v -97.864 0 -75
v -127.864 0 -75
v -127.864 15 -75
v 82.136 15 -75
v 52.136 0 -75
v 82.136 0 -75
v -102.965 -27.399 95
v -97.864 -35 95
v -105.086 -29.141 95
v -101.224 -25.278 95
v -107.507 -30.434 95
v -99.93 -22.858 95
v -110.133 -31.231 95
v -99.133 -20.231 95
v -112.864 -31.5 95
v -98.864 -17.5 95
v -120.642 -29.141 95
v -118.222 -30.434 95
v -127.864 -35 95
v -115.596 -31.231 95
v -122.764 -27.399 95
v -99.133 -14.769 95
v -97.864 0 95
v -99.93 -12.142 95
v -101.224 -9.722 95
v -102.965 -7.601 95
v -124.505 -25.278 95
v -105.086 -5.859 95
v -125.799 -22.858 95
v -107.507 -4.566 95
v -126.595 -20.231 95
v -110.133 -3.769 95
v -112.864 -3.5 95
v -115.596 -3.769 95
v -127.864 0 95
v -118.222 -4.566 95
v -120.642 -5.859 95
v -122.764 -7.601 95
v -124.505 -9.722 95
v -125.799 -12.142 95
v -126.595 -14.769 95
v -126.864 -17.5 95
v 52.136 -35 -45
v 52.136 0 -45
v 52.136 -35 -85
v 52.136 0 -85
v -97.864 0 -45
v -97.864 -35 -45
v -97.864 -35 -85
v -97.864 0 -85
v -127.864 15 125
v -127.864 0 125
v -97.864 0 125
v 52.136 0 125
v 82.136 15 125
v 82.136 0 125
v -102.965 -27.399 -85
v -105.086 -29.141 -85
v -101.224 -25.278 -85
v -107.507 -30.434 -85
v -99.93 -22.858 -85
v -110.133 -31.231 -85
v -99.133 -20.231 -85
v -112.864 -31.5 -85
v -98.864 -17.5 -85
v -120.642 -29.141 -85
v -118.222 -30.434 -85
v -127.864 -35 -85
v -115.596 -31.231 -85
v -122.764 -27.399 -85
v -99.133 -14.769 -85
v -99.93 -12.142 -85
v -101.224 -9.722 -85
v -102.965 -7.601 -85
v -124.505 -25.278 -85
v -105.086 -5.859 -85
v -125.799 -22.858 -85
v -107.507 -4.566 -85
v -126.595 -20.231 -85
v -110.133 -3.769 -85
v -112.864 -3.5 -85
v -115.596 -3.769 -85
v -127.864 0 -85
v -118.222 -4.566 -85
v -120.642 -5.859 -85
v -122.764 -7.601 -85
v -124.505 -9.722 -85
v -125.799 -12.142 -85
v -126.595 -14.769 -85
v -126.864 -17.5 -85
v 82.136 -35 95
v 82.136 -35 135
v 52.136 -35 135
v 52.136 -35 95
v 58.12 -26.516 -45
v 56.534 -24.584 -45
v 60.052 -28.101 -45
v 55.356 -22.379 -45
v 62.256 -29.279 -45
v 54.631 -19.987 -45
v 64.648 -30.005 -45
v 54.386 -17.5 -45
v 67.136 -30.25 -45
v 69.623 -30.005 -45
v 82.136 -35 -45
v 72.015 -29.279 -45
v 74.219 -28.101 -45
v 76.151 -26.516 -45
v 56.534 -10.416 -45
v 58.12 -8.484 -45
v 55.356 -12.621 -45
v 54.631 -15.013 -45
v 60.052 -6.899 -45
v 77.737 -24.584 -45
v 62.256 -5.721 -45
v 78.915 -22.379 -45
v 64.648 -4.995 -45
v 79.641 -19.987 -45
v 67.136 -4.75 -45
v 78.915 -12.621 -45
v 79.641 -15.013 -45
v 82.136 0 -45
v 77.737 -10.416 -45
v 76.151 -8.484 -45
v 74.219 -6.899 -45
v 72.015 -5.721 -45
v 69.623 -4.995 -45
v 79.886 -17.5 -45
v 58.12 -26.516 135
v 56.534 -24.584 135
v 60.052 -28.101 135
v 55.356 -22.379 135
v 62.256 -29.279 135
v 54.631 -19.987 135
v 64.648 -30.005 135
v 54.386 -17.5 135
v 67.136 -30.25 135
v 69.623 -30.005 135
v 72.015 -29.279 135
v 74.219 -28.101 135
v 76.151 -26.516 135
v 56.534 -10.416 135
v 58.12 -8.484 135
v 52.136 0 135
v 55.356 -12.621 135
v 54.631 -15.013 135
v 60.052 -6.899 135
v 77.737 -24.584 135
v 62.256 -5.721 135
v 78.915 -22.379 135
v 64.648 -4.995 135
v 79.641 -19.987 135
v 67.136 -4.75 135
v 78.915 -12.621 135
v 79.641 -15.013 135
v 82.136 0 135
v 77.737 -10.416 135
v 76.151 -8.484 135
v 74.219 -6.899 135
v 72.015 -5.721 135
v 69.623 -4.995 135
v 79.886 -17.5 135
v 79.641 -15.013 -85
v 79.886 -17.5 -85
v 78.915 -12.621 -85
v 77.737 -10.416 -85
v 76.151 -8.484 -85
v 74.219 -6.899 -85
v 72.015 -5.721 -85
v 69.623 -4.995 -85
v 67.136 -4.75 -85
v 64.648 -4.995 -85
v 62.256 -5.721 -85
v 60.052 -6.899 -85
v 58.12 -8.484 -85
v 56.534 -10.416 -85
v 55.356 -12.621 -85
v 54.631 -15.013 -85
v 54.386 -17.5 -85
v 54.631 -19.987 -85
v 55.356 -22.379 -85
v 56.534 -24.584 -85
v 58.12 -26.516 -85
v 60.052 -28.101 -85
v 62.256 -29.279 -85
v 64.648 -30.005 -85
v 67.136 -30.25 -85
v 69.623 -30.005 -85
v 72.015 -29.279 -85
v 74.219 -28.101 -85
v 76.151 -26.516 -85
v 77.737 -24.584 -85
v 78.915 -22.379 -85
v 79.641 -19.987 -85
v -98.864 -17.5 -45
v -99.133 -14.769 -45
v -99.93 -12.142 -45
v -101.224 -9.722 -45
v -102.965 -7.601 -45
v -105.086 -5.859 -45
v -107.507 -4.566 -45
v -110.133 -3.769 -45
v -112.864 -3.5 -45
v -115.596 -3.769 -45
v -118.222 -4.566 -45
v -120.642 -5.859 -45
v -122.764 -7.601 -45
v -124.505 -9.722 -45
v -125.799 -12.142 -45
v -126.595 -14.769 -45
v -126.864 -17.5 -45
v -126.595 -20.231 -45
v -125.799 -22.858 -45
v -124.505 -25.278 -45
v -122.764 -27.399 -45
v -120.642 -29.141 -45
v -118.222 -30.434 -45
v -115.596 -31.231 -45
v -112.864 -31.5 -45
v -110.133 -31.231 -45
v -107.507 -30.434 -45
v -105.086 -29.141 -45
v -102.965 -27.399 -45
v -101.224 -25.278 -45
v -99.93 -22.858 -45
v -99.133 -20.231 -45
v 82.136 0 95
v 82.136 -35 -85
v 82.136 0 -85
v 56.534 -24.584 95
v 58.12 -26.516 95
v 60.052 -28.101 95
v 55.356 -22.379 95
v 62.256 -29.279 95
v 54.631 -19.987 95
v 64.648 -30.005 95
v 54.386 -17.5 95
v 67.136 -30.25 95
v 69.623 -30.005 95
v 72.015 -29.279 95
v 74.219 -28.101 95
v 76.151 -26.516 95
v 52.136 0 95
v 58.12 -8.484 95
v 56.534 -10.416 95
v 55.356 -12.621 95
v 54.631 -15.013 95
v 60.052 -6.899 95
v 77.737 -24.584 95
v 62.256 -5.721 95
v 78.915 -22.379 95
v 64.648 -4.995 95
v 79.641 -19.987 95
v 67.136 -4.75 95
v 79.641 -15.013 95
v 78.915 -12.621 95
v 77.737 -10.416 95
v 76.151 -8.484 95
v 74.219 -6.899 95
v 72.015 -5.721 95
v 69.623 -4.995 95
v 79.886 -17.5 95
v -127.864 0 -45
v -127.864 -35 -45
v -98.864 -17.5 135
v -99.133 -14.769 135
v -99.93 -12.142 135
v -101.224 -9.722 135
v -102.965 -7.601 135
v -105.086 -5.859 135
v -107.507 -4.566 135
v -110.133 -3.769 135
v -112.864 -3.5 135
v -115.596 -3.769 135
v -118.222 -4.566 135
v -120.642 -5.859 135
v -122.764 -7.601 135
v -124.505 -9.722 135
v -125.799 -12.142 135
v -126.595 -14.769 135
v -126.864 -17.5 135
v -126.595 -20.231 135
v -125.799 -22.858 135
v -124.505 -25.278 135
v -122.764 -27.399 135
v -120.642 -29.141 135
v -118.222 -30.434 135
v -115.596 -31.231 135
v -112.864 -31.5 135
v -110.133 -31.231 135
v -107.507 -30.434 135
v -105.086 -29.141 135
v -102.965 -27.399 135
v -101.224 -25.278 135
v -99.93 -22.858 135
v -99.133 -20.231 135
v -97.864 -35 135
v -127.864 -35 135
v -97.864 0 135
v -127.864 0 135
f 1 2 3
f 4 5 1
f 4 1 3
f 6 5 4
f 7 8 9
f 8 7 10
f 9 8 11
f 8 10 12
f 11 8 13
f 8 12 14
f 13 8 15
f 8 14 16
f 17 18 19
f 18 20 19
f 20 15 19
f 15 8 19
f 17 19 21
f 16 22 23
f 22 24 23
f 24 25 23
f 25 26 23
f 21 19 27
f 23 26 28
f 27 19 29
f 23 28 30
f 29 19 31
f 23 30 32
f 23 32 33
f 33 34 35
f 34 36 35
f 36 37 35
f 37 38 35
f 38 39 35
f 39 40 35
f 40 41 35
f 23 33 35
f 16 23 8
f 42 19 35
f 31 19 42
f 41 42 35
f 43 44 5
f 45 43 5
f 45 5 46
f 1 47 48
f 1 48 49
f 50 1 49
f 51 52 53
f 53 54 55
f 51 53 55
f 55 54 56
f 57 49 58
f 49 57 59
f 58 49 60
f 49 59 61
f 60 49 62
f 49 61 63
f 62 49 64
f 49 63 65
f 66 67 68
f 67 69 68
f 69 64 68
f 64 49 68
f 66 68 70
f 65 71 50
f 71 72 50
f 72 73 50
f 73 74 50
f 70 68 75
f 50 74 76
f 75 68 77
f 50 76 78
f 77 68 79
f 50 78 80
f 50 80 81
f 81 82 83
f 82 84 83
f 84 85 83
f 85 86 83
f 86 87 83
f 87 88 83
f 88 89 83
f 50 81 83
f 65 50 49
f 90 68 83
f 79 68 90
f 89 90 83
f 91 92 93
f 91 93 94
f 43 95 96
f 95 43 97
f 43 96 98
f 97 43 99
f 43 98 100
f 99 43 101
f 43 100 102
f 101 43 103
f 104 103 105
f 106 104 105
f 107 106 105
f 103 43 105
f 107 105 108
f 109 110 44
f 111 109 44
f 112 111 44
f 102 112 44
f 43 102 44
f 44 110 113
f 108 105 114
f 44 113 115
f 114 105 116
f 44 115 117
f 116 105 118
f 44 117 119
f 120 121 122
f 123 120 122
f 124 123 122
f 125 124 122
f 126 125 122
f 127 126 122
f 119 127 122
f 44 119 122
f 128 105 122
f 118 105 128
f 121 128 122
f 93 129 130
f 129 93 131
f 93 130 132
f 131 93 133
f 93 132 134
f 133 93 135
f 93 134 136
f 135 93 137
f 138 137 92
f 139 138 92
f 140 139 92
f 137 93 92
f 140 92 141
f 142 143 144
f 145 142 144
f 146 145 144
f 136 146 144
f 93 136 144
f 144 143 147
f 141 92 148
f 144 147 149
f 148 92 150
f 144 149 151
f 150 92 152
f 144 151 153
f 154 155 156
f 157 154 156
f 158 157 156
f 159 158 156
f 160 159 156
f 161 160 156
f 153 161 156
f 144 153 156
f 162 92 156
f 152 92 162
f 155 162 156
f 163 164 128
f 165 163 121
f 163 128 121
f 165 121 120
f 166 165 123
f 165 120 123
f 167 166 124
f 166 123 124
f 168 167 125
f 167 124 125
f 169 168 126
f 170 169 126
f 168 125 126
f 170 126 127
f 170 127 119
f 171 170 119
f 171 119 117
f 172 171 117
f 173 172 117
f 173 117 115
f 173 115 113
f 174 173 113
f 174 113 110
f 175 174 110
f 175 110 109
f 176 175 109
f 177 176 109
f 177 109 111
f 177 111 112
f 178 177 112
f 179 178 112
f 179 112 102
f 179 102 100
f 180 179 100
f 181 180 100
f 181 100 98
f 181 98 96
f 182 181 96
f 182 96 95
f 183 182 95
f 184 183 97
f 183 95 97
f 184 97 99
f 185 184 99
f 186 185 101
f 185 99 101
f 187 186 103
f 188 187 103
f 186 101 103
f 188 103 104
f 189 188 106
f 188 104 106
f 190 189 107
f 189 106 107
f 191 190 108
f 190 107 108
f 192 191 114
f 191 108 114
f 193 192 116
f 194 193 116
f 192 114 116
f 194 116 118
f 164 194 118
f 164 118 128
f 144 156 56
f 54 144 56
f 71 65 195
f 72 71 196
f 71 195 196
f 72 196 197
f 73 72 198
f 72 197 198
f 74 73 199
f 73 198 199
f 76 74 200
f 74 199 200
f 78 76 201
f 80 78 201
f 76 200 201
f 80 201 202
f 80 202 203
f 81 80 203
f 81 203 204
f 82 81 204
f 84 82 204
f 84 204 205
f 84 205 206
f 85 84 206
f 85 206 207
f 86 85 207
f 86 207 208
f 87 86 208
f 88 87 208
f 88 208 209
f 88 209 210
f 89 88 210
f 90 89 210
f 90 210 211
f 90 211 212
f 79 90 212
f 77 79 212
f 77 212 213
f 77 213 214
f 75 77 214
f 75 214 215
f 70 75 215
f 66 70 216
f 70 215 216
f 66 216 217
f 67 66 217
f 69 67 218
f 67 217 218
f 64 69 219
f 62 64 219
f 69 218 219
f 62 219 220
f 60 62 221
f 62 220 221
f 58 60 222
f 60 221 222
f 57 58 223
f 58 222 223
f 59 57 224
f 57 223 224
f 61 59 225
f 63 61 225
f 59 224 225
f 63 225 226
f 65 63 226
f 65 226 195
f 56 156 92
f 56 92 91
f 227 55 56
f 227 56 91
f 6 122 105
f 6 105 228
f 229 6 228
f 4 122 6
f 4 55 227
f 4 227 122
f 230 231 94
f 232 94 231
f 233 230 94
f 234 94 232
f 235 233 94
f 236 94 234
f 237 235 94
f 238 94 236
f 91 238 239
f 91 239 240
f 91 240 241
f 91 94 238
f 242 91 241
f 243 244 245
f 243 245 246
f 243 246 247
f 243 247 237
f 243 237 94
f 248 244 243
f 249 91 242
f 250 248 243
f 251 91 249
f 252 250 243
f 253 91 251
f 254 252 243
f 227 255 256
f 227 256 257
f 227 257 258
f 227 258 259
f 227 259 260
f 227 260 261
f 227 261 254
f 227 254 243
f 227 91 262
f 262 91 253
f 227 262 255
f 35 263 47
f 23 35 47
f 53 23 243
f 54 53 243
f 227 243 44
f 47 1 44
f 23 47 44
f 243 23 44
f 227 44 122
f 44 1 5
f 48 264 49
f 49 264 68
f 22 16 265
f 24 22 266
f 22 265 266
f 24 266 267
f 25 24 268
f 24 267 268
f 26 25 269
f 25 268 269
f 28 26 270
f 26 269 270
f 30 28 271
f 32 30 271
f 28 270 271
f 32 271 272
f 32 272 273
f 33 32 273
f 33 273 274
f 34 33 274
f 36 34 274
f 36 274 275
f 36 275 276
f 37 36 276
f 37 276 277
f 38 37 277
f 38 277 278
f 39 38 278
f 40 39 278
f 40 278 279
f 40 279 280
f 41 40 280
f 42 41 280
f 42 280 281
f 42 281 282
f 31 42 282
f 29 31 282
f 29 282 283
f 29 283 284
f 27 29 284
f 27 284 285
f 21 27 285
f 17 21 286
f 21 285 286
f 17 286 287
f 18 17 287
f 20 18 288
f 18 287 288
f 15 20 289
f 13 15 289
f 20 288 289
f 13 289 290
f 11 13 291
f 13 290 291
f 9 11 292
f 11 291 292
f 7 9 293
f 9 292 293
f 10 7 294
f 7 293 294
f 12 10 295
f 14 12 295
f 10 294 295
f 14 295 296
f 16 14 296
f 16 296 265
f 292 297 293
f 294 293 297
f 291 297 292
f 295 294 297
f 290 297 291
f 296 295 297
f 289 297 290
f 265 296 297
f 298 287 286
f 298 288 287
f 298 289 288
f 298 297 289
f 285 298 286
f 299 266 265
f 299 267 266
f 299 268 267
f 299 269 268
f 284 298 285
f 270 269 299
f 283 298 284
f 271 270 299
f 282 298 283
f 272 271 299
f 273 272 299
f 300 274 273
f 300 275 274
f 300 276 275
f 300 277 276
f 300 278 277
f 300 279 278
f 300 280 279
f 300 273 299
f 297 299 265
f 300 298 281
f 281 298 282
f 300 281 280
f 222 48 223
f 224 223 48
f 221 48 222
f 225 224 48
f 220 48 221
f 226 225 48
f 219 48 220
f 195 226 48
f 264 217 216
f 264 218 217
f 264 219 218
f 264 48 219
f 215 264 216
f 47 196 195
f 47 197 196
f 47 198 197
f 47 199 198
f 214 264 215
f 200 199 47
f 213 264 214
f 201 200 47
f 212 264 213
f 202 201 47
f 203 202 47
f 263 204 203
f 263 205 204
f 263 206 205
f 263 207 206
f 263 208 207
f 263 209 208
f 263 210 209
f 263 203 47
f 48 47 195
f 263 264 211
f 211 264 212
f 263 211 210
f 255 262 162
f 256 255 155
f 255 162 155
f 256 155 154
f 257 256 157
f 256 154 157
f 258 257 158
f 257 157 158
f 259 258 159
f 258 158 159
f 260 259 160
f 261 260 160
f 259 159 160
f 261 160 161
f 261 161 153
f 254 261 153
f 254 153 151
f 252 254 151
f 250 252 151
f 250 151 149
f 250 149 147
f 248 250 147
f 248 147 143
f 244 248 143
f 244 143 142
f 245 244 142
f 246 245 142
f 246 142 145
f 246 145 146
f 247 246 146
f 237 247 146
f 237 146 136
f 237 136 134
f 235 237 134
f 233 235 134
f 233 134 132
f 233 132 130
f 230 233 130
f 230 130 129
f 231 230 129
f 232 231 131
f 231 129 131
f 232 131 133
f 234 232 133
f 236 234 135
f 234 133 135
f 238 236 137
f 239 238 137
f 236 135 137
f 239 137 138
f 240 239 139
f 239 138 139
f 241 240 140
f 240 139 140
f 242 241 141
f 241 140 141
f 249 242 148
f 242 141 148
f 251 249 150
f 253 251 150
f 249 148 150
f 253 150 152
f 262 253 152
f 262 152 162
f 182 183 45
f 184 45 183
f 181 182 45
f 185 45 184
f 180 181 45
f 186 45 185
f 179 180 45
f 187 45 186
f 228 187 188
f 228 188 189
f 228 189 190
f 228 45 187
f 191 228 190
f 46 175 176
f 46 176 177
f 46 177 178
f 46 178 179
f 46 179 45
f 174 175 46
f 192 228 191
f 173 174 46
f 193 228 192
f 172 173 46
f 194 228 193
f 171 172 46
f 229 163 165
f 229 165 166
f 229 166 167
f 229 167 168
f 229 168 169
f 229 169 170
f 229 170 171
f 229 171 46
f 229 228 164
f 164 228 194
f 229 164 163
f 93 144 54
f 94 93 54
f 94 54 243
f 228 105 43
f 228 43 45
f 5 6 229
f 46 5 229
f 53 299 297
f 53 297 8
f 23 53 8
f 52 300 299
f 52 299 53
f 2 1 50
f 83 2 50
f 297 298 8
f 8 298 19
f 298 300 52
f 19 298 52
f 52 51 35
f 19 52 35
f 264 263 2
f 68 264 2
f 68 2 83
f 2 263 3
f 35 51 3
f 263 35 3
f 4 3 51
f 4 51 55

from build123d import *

# Parameters (mm, degrees)
IZIM1_W                     = 210
IZIM1_H                     = 200
Y_KSEKLIK_EKSTR_ZYON1_DEPTH = 15
IZIM2_W                     = 40
IZIM2_H                     = 35
Y_KSEKLIK_EKSTR_ZYON2_DEPTH = 30
IZIM7_R                     = 12.75
IZIM7_R_2                   = 14
KES_EKSTR_ZYON2_DEPTH       = 504


with BuildPart() as part:
    # Çizim1 → Yükseklik-Ekstrüzyon1 (new body)
    with BuildSketch(Plane(origin=(0, 0, 0), x_dir=(1, 0, 0), z_dir=(0, 1, 0))):
        with Locations((-22.864290172, -25)):
            Rectangle(IZIM1_W, IZIM1_H)
    extrude(amount=Y_KSEKLIK_EKSTR_ZYON1_DEPTH)

    # Çizim2 → Yükseklik-Ekstrüzyon2 (add)
    with BuildSketch(Plane(origin=(82.135709828, 0, 0), x_dir=(0, 0, -1), z_dir=(1, 0, 0))):
        with Locations((-115, -17.5)):
            Rectangle(IZIM2_W, IZIM2_H)
        with Locations((65, -17.5)):
            Rectangle(IZIM2_W, IZIM2_H)
    y_kseklik_ekstr_zyon2 = extrude(amount=-Y_KSEKLIK_EKSTR_ZYON2_DEPTH)

    # Aynalama1: Yükseklik-Ekstrüzyon2 across plane
    add(y_kseklik_ekstr_zyon2.mirror(Plane(origin=(-22.864290172, 0, 0), x_dir=(0, 0, 1), z_dir=(1, 0, 0))))

    # Çizim7 → Kes-Ekstrüzyon2 (cut)
    with BuildSketch(Plane.XY.offset(135)):
        with Locations((67.135709828, -17.5)):
            Circle(IZIM7_R)
        with Locations((-112.864290172, -17.5)):
            Circle(IZIM7_R_2)
    extrude(amount=-KES_EKSTR_ZYON2_DEPTH, mode=Mode.SUBTRACT)


solid = part.part
